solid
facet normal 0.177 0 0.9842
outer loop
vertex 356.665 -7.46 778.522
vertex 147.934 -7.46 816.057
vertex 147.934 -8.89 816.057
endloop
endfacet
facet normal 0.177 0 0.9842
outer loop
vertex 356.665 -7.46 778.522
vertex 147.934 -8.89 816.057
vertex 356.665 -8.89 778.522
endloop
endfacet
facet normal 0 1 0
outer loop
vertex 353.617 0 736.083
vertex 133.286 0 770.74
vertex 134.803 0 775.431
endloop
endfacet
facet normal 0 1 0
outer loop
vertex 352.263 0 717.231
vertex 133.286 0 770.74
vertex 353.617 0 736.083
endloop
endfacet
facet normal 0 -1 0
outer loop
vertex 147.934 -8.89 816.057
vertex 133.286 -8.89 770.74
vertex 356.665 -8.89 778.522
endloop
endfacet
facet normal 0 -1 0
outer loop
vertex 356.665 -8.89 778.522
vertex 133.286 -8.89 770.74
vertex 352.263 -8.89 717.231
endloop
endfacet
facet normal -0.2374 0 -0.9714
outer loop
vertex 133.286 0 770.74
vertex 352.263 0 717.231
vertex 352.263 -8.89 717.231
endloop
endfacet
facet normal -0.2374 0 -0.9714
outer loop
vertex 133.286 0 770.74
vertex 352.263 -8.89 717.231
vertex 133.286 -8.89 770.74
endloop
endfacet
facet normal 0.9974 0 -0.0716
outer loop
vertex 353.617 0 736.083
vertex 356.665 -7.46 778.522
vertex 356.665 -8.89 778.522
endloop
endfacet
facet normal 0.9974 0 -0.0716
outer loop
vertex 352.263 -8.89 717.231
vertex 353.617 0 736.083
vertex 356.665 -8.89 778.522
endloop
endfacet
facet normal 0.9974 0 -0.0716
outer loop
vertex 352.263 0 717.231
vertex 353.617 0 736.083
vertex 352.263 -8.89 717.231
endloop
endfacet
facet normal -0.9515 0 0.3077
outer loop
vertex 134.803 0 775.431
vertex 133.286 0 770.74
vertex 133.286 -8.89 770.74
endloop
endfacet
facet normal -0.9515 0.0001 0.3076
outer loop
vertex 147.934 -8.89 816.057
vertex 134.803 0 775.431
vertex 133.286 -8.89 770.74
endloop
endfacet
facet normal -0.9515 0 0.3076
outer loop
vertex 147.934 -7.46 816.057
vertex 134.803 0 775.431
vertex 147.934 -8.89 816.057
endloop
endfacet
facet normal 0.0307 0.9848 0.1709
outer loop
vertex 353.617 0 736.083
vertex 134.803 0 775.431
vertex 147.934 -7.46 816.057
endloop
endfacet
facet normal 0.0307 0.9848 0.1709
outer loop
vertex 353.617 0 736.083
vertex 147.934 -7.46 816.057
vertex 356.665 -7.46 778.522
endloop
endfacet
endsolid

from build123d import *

# Parameters (mm, degrees)
BOSS_EXTRUDE1_DEPTH = 8.89
CHAMFER1_SIZE       = 7.46
CHAMFER1_SIZE2      = 42.307762374


with BuildPart() as part:
    # Sketch2 → Boss-Extrude1 (new body)
    with BuildSketch(Plane(origin=(0, 0, 0), x_dir=(1, 0, 0), z_dir=(0, 1, 0))):
        Polygon((133.286430852, -770.74001749), (147.934191067, -816.056525657), (356.664774137, -778.521640105), (352.263248298, -717.230631168), align=None)
    extrude(amount=-BOSS_EXTRUDE1_DEPTH)

    # Chamfer1
    chamfer1_edges = [part.edges().sort_by_distance(p)[0] for p in [
        (252.299482602, 0, 797.289082881),
    ]]
    chamfer1_side = [part.faces().sort_by_distance(p)[0] for p in [
        (252.299482602, -4.445, 797.289082881),
    ]]
    chamfer(chamfer1_edges, length=CHAMFER1_SIZE, length2=CHAMFER1_SIZE2, reference=chamfer1_side[0])


solid = part.part
